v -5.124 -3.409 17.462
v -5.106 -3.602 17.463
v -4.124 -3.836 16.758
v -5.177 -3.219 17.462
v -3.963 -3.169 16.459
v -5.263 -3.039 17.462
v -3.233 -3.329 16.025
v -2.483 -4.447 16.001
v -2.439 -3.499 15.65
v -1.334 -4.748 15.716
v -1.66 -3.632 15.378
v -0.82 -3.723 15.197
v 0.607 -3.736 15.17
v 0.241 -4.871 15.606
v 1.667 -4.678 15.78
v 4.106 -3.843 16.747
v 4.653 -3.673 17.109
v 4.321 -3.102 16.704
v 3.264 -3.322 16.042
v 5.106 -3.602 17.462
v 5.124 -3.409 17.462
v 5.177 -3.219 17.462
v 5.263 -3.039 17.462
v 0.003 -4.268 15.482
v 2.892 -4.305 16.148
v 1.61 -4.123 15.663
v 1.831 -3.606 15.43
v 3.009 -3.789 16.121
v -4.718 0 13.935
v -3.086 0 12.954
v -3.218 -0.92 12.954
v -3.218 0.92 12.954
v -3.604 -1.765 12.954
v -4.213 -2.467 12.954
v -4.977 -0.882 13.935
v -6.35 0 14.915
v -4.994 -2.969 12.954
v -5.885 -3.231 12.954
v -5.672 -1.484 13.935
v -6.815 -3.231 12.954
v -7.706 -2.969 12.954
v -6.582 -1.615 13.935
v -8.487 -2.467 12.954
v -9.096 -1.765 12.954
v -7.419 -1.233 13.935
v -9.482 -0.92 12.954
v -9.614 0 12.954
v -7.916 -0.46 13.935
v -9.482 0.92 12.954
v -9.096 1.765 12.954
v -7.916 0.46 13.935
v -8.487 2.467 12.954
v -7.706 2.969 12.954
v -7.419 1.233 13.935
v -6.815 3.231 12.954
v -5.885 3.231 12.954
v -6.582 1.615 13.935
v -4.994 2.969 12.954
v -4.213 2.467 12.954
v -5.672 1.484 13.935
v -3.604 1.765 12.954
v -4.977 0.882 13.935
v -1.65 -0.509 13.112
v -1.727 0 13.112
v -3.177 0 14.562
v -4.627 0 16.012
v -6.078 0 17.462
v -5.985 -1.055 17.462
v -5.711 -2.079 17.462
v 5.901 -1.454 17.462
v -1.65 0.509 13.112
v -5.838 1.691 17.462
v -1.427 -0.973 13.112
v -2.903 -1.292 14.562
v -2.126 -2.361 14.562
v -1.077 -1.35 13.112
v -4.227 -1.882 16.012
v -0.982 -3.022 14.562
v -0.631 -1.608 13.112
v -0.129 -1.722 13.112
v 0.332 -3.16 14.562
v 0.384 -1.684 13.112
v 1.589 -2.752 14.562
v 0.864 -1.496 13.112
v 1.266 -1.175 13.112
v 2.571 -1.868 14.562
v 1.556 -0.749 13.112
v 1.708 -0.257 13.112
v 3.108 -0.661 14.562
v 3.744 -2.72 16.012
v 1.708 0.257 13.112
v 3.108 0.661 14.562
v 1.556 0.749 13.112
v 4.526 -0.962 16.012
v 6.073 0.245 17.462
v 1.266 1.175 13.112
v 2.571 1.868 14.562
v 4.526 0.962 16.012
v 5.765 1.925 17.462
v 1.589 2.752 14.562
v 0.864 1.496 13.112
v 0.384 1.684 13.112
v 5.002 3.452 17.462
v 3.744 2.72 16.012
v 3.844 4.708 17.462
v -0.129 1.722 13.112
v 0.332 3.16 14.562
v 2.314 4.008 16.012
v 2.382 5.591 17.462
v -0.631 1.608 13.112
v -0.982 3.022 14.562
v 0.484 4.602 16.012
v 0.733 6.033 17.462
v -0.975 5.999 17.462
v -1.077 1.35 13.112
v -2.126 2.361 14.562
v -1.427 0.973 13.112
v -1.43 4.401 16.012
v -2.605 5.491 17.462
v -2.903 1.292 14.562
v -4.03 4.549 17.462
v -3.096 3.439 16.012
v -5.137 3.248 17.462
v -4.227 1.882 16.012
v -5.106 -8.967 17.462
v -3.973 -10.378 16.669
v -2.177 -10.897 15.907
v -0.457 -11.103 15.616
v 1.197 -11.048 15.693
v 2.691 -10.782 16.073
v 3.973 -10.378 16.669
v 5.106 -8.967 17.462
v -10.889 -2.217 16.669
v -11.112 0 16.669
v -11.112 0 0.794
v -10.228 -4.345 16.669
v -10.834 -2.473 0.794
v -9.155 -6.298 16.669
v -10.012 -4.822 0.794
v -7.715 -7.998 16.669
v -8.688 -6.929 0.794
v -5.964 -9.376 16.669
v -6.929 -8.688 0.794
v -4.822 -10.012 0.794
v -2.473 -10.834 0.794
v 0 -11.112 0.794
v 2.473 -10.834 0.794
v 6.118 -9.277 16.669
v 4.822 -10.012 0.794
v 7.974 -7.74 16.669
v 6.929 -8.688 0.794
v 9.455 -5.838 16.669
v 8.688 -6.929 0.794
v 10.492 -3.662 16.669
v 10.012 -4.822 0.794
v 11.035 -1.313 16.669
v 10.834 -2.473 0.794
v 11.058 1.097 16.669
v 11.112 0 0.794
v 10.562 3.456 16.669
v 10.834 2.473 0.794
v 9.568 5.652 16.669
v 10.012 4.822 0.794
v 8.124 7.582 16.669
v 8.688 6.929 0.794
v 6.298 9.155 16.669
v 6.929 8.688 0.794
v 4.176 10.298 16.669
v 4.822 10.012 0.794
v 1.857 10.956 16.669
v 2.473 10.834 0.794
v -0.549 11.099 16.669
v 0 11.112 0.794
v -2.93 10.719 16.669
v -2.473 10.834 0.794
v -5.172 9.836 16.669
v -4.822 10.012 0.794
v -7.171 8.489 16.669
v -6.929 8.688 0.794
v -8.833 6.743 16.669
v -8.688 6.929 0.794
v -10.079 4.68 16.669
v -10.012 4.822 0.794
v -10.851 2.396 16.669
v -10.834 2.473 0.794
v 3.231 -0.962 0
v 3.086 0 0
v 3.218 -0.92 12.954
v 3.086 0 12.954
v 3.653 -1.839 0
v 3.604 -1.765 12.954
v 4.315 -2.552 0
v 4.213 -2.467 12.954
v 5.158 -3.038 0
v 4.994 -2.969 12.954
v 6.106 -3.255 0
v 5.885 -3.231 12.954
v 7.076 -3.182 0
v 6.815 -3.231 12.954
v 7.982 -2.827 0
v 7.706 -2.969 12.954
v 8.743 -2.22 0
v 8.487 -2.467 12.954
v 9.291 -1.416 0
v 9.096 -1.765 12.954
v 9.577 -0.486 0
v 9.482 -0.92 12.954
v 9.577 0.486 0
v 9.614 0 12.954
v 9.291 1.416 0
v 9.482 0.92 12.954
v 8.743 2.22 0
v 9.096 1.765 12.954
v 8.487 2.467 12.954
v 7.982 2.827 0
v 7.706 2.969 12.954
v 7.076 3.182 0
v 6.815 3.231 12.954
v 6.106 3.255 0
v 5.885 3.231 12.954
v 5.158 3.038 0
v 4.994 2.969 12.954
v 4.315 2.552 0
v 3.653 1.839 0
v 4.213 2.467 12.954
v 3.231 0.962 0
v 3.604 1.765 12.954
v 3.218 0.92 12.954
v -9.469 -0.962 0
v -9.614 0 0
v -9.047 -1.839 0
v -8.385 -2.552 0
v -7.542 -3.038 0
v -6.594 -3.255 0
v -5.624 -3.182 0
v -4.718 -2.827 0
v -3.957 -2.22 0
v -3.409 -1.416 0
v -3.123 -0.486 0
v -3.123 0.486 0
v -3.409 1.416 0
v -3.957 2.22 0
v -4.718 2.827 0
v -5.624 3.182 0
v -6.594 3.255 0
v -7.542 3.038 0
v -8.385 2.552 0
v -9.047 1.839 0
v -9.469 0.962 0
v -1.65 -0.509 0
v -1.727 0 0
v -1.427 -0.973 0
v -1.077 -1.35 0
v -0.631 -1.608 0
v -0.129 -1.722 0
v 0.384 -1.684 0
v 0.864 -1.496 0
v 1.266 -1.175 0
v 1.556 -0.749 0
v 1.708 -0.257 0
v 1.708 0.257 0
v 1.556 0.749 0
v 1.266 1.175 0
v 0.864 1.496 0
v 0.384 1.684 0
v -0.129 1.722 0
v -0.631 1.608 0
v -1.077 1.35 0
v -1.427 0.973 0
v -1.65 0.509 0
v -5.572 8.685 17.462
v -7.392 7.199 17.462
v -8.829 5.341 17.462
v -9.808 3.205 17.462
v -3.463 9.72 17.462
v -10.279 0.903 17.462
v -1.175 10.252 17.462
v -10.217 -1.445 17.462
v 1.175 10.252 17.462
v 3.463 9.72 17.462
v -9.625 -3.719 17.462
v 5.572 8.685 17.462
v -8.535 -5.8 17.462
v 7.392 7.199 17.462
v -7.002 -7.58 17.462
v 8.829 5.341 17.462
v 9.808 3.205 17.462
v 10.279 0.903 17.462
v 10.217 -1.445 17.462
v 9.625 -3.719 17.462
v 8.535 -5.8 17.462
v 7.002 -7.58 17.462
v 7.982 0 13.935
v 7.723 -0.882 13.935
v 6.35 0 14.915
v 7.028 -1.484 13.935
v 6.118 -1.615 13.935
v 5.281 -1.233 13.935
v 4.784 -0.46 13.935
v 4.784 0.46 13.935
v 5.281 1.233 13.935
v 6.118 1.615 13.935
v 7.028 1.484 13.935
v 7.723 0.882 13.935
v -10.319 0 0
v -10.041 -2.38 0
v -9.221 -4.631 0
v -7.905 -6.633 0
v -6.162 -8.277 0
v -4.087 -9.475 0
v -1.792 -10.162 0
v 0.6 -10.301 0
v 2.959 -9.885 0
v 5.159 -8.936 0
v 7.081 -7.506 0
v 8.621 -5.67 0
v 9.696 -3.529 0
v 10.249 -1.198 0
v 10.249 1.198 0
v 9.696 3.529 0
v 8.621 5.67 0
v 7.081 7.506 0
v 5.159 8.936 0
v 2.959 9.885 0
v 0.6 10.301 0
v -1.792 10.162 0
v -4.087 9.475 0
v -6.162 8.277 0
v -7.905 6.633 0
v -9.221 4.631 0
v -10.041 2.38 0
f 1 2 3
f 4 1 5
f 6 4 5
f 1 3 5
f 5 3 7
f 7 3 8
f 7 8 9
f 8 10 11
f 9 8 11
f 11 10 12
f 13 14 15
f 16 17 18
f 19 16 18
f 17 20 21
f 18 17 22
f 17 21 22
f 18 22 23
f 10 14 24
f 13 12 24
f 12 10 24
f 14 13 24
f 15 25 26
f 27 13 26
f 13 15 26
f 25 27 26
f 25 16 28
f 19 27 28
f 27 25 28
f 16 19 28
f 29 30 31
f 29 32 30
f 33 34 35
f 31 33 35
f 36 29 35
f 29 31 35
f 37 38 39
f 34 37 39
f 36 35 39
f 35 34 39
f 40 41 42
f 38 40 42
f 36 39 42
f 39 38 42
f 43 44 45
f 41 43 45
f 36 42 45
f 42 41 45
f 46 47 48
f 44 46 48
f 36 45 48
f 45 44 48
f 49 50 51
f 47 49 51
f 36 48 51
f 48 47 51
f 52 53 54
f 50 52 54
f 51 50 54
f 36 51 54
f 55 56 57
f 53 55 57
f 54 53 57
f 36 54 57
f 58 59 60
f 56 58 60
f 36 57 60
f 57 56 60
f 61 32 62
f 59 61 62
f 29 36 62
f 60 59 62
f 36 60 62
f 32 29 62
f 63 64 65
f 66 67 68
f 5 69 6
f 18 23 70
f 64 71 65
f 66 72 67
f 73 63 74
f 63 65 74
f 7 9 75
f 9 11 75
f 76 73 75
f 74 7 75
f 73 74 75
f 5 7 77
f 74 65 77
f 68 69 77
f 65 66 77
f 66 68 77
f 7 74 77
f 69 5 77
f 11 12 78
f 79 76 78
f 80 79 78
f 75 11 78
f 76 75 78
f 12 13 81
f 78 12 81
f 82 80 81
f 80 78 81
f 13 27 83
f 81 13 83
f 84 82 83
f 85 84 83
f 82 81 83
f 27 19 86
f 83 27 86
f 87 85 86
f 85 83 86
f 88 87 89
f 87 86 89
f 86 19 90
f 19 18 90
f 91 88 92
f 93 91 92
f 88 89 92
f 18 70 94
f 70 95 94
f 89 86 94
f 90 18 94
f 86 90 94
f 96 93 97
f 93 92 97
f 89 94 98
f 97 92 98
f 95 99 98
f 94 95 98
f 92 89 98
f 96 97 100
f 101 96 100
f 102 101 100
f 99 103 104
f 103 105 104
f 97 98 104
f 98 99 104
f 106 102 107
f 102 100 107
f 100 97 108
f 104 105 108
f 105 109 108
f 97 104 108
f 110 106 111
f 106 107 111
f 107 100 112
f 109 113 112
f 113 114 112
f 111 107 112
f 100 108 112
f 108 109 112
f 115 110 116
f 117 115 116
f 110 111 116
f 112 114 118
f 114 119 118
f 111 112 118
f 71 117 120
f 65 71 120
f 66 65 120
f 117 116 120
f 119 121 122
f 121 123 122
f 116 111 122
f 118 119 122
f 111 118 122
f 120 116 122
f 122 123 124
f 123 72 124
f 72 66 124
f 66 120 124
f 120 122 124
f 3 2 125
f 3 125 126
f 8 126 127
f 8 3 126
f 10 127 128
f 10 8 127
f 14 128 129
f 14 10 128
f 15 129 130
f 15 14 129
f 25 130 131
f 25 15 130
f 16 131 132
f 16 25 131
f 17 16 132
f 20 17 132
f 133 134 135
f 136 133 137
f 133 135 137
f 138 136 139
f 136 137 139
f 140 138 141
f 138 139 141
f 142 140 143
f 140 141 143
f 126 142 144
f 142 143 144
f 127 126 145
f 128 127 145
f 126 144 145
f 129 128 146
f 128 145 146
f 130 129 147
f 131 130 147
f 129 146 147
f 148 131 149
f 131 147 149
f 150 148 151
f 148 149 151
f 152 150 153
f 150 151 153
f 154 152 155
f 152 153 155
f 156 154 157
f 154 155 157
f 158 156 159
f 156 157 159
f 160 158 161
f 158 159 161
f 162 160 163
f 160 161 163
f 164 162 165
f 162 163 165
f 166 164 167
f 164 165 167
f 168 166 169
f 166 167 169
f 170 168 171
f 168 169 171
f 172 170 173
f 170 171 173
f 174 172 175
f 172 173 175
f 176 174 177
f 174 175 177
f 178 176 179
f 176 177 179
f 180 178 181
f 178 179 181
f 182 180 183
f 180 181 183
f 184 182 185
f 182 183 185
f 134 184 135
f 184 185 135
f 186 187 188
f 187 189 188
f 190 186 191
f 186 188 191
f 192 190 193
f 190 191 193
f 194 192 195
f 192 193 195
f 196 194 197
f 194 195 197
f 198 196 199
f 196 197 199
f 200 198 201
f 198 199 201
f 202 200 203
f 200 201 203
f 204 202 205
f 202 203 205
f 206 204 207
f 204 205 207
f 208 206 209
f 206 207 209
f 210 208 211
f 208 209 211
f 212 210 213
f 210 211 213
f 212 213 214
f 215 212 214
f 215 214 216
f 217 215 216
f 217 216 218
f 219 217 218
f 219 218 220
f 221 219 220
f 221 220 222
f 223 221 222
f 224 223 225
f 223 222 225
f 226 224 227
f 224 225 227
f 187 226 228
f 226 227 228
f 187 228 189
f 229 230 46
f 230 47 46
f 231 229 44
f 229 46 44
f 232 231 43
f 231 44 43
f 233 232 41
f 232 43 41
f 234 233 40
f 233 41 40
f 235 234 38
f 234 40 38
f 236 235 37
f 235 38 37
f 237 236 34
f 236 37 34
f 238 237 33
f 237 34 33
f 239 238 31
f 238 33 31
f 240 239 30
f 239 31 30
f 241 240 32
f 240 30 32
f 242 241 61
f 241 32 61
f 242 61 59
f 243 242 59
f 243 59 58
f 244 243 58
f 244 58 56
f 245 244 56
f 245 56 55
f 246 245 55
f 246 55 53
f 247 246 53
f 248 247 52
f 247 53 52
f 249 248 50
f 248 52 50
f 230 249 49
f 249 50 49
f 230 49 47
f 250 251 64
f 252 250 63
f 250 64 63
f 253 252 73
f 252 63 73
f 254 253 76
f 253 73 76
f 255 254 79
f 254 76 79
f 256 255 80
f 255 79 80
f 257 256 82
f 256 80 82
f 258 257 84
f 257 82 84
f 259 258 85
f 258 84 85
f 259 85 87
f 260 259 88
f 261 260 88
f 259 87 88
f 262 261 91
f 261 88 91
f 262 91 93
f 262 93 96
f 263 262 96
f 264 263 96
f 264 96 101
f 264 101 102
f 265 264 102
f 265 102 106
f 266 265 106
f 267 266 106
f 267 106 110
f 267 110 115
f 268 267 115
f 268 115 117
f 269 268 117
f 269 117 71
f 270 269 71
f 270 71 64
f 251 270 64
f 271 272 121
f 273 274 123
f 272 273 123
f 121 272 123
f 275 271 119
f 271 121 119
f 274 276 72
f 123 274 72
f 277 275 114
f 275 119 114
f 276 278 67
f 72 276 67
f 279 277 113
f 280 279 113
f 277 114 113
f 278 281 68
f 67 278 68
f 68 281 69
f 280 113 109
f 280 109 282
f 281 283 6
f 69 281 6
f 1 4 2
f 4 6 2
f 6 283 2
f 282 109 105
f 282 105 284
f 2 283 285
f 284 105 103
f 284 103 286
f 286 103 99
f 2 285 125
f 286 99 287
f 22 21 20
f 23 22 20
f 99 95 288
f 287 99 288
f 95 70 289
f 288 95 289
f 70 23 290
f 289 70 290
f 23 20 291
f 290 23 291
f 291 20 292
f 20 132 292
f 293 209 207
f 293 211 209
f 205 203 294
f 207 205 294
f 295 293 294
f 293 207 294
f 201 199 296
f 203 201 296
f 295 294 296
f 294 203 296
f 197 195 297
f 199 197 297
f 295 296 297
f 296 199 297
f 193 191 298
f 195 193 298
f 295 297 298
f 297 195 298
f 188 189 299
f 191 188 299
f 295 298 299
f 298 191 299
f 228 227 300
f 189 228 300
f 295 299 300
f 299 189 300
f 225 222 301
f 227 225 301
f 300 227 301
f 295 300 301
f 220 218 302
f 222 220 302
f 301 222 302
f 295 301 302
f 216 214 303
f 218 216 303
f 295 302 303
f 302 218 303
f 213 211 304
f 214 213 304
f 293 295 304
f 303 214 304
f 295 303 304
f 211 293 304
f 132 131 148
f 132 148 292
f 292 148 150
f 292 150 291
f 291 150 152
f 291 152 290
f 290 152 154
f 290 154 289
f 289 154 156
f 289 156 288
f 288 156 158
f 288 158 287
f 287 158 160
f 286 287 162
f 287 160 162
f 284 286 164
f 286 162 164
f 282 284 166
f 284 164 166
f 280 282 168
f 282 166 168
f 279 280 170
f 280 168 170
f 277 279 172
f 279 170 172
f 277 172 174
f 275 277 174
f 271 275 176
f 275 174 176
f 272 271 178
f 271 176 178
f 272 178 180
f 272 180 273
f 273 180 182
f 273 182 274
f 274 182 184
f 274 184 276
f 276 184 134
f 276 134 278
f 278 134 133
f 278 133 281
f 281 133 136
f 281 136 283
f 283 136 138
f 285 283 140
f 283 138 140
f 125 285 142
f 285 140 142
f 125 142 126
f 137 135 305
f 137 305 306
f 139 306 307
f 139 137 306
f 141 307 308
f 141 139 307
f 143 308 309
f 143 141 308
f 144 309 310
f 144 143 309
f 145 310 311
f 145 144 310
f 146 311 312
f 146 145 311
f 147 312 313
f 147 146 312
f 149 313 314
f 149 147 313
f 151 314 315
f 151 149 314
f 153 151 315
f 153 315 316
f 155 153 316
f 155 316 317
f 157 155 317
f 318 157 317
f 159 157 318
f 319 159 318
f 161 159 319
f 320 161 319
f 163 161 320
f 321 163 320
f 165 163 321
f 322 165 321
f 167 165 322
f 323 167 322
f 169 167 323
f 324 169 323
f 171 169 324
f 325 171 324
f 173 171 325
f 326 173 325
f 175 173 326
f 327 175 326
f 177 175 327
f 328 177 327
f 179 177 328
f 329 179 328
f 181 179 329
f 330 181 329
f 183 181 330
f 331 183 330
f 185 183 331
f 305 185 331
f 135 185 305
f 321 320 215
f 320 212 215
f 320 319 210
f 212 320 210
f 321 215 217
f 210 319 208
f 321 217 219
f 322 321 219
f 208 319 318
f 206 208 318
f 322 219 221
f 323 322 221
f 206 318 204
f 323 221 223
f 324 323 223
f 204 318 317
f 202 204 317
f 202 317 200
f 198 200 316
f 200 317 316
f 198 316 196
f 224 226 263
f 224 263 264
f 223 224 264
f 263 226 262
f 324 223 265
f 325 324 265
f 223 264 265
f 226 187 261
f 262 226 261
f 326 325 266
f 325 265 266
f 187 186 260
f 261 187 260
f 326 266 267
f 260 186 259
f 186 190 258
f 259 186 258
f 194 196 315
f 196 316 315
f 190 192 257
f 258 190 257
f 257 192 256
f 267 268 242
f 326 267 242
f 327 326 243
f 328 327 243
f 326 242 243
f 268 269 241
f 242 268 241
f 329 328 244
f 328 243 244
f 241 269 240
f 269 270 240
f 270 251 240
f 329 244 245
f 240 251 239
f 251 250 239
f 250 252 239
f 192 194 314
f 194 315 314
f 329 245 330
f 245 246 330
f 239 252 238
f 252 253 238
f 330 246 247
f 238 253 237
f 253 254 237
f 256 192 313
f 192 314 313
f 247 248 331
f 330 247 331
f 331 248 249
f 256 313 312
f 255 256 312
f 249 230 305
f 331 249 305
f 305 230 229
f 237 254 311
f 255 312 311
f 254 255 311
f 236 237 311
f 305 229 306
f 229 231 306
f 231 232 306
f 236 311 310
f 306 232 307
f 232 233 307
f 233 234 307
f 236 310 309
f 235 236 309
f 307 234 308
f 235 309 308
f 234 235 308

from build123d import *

# Parameters (mm, degrees)
F2_SIZE  = 0.79375
F3_R     = 7.9375
F4_DEPTH = 25.4
F5_R     = 1.5875
F7_D     = 3.4544
F8_D     = 6.5278
F8_DEPTH = 12.954
F8_TIP   = 1.9611489744


with BuildPart() as f1:
    # F0 (on Front) → F1 (revolve)
    with BuildSketch(Plane.XZ):
        Polygon((-11.1125, 0), (0, 0), (0, 11.3848719395), (-6.0776280605, 17.4625), (-11.1125, 17.4625), align=None)
    revolve(axis=Axis((0, 0, 5.6924359697), (0, 0, 1)))

    # F2
    f2_edges = [f1.edges().sort_by_distance(p)[0] for p in [
        (11.1125, 0, 0),
        (11.1125, 0, 17.4625),
    ]]
    chamfer(f2_edges, length=F2_SIZE)

    # F3 (on Front) → F4 (cut)
    with BuildSketch(Plane.XZ):
        with Locations((0, 23.5401280605)):
            Circle(F3_R)
    extrude(amount=F4_DEPTH, mode=Mode.SUBTRACT)

    # F5
    f5_edges = [f1.edges().sort_by_distance(p)[0] for p in [
        (0, -4.217756, 15.602628),
    ]]
    fillet(f5_edges, radius=F5_R)

    # F7 (through all)
    with Locations(Plane(origin=(0, 0, 0), x_dir=(1, 0, 0), z_dir=(0, 0, -1))):
        with Locations((0, 0)):
            Hole(F7_D / 2)

    # F8
    with Locations(Plane(origin=(0, 0, 0), x_dir=(1, 0, 0), z_dir=(0, 0, -1))):
        with Locations((6.35, 0), (-6.35, 0)):
            Hole(F8_D / 2, depth=F8_DEPTH)
            with Locations((0, 0, -(F8_DEPTH + F8_TIP / 2))):  # 118° drill point
                Cone(0, F8_D / 2, F8_TIP, mode=Mode.SUBTRACT)


solid = f1.part
